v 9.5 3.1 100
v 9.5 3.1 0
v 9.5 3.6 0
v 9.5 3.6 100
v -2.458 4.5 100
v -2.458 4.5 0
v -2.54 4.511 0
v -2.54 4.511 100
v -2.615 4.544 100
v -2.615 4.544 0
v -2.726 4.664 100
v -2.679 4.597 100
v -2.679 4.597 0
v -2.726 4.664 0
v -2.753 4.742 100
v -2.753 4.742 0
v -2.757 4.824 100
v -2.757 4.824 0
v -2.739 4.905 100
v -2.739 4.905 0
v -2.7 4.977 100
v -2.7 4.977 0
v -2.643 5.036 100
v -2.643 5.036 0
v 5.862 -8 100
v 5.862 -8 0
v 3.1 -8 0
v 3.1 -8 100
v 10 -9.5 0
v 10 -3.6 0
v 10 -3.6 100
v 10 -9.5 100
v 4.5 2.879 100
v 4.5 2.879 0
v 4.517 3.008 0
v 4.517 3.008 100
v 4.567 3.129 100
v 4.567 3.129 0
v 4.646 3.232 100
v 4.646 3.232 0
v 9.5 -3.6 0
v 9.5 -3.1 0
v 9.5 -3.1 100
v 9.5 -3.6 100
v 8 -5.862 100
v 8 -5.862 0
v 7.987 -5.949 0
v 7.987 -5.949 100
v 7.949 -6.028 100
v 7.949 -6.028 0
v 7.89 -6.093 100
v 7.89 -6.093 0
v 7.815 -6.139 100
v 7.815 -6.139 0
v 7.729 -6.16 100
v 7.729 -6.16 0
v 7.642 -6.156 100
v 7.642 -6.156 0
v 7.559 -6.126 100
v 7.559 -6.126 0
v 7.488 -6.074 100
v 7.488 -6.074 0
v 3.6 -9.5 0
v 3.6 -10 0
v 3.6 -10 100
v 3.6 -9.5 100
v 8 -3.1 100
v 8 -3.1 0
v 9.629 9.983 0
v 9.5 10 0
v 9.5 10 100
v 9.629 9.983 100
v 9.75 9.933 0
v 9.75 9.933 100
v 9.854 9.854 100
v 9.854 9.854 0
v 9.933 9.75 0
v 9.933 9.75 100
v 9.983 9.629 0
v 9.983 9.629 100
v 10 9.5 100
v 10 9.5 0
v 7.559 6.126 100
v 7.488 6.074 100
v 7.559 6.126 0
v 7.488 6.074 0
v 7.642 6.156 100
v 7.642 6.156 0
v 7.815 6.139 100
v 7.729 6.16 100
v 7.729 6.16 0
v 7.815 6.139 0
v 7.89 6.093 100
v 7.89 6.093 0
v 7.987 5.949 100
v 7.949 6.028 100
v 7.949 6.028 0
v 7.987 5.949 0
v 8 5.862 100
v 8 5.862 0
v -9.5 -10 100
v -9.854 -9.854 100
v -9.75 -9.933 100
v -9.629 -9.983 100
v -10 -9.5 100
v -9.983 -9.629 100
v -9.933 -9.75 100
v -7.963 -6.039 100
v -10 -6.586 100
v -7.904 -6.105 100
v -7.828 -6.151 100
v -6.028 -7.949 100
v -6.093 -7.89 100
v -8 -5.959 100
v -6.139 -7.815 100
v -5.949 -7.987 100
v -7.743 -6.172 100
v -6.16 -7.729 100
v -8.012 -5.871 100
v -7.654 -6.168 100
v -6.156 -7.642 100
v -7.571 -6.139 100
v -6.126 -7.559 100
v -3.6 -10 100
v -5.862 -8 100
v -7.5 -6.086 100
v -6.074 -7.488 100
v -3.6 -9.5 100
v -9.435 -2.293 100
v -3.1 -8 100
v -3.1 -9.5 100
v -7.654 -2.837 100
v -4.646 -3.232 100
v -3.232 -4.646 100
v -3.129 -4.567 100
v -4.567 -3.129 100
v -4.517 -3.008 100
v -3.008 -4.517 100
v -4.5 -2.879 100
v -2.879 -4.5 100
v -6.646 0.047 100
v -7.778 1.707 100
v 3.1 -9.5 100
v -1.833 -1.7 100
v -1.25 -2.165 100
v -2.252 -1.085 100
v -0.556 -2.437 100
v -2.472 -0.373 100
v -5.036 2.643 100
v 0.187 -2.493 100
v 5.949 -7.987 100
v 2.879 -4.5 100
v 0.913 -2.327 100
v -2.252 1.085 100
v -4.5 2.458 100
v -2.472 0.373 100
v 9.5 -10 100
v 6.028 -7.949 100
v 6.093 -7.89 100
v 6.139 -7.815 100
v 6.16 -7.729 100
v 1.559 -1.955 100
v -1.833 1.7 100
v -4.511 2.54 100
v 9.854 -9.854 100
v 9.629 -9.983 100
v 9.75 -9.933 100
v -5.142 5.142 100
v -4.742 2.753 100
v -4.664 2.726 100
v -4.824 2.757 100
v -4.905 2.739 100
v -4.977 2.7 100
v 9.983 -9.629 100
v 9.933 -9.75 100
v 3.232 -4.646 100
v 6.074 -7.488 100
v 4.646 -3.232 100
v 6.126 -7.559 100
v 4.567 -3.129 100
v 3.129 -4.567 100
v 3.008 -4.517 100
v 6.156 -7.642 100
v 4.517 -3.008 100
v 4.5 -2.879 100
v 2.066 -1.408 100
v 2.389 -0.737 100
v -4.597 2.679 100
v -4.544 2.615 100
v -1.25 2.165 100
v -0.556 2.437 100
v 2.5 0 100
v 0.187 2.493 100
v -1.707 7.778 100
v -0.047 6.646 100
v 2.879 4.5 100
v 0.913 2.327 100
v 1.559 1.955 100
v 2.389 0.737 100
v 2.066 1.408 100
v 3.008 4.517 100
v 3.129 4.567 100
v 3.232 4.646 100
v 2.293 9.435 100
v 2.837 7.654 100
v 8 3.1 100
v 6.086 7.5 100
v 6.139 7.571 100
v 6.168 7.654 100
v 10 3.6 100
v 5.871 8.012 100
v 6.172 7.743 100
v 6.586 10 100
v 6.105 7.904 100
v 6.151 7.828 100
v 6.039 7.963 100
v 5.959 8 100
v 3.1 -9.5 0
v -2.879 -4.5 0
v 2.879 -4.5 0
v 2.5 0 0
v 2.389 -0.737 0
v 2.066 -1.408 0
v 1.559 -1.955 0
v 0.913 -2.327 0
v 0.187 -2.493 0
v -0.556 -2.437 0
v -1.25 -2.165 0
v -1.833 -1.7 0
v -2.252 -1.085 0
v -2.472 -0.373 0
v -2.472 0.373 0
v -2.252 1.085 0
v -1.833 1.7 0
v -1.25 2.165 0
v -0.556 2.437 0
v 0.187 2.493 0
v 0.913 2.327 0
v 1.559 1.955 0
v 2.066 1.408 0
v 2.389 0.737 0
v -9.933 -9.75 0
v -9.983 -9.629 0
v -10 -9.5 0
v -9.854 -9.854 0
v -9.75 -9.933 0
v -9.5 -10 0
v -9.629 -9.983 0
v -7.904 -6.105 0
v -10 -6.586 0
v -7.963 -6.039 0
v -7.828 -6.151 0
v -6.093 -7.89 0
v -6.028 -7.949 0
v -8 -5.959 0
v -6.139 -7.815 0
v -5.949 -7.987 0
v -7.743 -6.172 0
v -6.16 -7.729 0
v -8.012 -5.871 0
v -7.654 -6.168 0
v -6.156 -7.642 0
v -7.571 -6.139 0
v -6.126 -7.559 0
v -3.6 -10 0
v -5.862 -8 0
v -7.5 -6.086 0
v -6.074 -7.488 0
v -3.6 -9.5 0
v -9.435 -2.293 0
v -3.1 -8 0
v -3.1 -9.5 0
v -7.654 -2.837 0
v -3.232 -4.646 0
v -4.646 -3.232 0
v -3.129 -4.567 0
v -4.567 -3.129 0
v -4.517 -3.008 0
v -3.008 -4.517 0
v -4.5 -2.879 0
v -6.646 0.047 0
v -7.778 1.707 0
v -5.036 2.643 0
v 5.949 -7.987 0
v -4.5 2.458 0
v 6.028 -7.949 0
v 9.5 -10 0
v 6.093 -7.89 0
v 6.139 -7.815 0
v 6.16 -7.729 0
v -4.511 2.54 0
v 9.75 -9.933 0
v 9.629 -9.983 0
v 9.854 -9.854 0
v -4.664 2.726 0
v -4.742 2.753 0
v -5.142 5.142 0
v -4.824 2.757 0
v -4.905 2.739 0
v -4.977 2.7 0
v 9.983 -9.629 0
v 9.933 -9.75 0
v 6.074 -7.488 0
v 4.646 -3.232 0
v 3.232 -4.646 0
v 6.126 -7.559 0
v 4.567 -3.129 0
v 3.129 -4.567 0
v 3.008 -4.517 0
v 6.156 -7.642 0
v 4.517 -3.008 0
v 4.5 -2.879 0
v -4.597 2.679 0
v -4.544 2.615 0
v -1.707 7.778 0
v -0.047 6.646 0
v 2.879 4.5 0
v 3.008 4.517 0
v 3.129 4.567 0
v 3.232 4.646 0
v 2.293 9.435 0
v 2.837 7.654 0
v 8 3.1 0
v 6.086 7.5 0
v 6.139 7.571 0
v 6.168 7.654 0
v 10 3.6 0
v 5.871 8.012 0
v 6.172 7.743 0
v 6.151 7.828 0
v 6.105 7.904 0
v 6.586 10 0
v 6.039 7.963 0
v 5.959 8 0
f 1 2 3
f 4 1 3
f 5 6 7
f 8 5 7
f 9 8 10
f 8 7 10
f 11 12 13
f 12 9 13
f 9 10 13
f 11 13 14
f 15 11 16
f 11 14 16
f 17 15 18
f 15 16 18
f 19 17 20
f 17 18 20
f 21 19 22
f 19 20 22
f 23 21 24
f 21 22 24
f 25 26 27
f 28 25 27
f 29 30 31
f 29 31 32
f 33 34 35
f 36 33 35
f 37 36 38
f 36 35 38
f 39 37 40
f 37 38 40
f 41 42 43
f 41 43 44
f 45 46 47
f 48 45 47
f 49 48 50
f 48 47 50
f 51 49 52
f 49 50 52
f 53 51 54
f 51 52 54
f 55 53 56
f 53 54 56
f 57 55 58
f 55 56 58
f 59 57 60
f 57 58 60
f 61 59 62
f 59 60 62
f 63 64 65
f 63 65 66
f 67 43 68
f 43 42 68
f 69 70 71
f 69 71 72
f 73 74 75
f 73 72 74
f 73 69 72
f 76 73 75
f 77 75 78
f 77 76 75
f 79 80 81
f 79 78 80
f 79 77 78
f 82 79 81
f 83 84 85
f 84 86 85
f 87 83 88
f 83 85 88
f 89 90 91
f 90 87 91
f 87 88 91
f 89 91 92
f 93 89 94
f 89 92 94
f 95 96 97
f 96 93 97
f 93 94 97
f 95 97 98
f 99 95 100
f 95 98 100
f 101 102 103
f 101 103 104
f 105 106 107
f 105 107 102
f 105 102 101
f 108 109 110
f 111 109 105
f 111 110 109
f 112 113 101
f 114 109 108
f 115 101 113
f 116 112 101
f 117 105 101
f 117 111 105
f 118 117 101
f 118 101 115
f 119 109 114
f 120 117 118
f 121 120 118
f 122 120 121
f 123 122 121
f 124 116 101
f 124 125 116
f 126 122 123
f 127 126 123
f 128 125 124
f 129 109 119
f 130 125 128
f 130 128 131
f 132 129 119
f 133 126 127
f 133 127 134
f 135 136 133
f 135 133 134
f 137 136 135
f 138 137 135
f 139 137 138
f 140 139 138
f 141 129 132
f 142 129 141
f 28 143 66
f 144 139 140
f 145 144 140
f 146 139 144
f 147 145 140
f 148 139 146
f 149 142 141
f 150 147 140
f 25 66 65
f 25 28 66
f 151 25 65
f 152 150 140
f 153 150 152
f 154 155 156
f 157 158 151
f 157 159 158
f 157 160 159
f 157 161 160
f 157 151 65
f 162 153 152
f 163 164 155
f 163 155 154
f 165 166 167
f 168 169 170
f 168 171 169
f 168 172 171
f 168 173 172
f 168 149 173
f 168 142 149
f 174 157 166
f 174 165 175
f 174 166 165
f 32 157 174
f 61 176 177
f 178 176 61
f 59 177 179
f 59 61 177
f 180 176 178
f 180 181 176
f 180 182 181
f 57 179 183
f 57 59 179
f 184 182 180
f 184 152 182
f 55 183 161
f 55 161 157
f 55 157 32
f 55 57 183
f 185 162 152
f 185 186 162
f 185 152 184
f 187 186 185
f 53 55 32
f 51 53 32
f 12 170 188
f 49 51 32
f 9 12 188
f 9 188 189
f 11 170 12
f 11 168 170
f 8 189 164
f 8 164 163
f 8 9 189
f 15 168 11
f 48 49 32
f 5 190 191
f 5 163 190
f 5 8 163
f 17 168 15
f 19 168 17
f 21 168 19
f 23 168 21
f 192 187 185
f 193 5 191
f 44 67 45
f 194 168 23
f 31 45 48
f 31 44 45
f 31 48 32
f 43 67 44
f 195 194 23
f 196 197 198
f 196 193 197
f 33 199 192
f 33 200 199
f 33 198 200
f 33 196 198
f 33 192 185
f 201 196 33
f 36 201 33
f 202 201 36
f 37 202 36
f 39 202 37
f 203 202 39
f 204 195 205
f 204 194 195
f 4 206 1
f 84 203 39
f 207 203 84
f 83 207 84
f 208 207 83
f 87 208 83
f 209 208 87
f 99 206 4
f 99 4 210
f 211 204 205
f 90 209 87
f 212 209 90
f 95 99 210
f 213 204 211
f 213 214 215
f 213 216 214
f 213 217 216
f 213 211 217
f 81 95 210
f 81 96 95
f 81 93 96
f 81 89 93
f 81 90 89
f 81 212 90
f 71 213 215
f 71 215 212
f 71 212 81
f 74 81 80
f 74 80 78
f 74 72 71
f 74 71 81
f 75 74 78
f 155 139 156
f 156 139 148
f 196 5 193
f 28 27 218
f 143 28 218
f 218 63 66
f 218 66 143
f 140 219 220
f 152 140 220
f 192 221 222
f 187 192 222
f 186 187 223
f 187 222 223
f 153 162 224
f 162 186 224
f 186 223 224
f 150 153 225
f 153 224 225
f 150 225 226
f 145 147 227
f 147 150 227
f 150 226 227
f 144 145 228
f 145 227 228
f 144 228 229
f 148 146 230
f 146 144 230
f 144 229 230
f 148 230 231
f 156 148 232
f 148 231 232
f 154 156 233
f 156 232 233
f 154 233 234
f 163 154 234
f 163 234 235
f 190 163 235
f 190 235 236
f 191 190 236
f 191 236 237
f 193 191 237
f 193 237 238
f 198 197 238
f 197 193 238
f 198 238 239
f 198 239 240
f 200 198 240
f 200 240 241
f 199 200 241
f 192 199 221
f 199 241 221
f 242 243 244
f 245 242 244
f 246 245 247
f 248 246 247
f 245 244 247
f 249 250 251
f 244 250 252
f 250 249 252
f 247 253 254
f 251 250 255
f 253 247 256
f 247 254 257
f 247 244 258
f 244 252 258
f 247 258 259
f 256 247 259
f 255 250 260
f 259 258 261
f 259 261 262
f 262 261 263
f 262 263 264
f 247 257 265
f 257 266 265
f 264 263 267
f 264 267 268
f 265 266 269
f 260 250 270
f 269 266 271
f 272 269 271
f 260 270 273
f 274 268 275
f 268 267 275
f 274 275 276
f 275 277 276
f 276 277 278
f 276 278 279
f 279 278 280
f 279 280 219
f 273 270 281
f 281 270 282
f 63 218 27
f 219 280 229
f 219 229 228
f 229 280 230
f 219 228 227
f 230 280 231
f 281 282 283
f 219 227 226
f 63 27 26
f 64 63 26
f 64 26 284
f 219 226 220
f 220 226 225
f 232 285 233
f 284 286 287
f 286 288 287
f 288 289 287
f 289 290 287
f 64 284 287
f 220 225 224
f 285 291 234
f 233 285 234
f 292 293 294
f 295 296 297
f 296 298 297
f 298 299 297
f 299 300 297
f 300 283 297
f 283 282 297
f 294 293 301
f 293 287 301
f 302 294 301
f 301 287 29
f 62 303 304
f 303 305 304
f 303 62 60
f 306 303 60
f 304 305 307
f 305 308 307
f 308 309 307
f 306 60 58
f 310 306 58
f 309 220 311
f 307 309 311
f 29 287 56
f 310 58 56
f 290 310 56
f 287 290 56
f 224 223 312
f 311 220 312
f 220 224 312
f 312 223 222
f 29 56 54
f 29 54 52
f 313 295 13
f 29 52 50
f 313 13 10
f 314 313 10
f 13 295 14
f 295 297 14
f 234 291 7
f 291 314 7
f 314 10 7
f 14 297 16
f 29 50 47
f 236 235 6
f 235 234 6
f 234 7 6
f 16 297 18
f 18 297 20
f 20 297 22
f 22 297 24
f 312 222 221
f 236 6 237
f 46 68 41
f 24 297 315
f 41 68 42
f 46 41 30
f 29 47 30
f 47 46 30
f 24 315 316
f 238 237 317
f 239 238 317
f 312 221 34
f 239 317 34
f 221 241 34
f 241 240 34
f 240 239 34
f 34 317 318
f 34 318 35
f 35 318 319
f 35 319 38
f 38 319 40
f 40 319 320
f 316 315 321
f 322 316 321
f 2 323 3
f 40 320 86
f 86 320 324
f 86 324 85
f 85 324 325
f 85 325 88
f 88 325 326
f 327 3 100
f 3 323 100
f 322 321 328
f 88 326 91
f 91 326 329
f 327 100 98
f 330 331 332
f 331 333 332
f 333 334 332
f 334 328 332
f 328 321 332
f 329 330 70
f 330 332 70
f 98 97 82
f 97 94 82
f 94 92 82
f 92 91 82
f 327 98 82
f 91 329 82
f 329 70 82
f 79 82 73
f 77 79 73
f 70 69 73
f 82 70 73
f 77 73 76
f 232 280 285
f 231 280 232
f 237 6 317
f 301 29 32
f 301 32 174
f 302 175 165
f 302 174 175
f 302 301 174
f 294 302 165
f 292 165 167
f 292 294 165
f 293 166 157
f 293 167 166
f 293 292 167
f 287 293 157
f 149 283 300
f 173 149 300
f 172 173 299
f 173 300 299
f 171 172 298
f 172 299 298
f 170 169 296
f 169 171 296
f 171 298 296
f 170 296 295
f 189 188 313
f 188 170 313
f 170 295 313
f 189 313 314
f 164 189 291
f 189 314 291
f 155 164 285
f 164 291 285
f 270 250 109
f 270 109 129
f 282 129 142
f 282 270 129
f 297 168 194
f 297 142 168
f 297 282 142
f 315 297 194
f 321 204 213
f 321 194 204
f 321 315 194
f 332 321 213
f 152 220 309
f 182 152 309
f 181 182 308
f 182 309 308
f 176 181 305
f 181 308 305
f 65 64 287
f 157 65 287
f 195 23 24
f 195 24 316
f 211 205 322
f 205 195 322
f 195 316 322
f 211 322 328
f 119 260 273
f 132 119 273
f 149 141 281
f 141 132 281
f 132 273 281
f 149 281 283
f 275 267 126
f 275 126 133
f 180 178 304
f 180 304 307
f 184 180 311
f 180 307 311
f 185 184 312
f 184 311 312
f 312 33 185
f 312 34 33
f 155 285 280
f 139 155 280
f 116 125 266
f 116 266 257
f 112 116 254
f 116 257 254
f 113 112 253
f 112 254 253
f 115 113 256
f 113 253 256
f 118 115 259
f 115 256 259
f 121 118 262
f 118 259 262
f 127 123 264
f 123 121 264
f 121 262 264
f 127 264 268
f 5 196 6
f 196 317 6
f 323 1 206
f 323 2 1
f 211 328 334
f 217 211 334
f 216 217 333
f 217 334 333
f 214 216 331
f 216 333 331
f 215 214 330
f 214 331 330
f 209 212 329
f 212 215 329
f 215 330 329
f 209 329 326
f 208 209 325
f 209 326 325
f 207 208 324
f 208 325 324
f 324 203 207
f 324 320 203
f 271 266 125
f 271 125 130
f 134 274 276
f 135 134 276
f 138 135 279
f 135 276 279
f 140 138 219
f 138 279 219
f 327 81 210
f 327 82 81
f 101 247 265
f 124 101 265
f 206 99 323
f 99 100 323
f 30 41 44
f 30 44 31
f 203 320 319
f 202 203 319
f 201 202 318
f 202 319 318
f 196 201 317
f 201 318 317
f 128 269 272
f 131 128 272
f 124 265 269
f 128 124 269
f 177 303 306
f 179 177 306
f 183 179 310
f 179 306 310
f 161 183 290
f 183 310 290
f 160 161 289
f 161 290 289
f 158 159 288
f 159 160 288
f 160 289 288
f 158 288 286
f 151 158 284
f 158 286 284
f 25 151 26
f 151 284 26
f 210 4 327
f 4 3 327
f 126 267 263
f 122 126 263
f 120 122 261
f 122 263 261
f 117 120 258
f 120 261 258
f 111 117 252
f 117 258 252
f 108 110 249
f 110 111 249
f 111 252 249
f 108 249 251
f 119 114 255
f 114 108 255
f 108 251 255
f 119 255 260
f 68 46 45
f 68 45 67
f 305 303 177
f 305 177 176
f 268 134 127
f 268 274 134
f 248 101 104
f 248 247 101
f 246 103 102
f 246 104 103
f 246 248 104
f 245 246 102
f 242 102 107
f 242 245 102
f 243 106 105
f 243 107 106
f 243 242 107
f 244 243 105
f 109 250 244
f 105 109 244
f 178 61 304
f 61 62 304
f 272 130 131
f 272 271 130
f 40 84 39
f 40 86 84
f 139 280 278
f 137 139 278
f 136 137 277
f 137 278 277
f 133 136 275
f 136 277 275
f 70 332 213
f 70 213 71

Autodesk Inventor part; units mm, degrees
ref_plane "YZ Plane" through (0, 0, 0) normal (1, 0, 0) x (0, 1, 0)
ref_plane "XZ Plane" through (0, 0, 0) normal (0, 1, 0) x (-1, 0, 0)
ref_plane "XY Plane" through (0, 0, 0) normal (0, 0, 1) x (1, 0, 0)
sketch "Esboço1" plane through (0, 0, 0) normal (0, 0, 1) x (1, 0, 0)
  circle A0 centre (0, 0) radius 2.5
  line L0 (-10, 10) -> (10, 10) construction
  line L1 (10, 10) -> (10, 3.1) construction
  line L2 (8, 3.1) -> (10, 3.1) construction
  line L3 (10, 10) -> (0, 0) construction
  line L4 (-4.5, 4.5) -> (4.5, 4.5) construction
  line L5 (10, -3.1) -> (10, -10) construction
  line L6 (8, -3.1) -> (10, -3.1) construction
  line L7 (4.5, 4.5) -> (4.5, -4.5) construction
  line L8 (-4.5, -4.5) -> (4.5, -4.5) construction
  line L9 (-4.5, 4.5) -> (-4.5, -4.5) construction
  line L10 (8, 6.5858) -> (4.5, 3.0858) construction
  line L11 (8, 6.5858) -> (8, 3.1) construction
  line L12 (0, 0) -> (10, -10) construction
  line L13 (4.5, -3.0858) -> (8, -6.5858) construction
  line L14 (8, -3.1) -> (8, -6.5858) construction
  line L15 (3.0858, -4.5) -> (6.5858, -8) construction
  line L16 (3.1, -10) -> (10, -10) construction
  line L17 (3.1, -8) -> (3.1, -10) construction
  line L18 (3.1, -8) -> (6.5858, -8) construction
  line L19 (0, 0) -> (-10, -10) construction
  line L20 (-10, -10) -> (-3.1, -10) construction
  line L21 (-3.1, -8) -> (-3.1, -10) construction
  line L22 (-3.0858, -4.5) -> (-6.5858, -8) construction
  line L23 (-6.5858, -8) -> (-3.1, -8) construction
  line L24 (-4.5, -3.0858) -> (-8, -6.5858) construction
  arc A1 (-2.8787, -4.5) -> (-3.2322, -4.6464) centre (-2.8787, -5) ccw
  arc A2 (3.2322, -4.6464) -> (2.8787, -4.5) centre (2.8787, -5) ccw
  line L25 (-2.8787, -4.5) -> (2.8787, -4.5)
  line L26 (-3.2322, -4.6464) -> (-6.5858, -8) construction
  arc A3 (4.5, -2.8787) -> (4.6464, -3.2322) centre (5, -2.8787) ccw
  arc A4 (4.6464, 3.2322) -> (4.5, 2.8787) centre (5, 2.8787) ccw
  line L27 (-10, 10) -> (0, 0) construction
  line L28 (4.6464, 3.2322) -> (8, 6.5858) construction
  arc A5 (7.4879, -6.0737) -> (8, -5.8615) centre (7.7, -5.8615) ccw
  line L29 (7.4879, -6.0737) -> (4.6464, -3.2322)
  line L30 (8, -5.8615) -> (8, -3.1)
  arc A6 (5.8615, -8) -> (6.0737, -7.4879) centre (5.8615, -7.7) ccw
  line L31 (5.8615, -8) -> (3.1, -8)
  line L32 (6.0737, -7.4879) -> (3.2322, -4.6464)
  arc A7 (8, 5.8615) -> (7.4879, 6.0737) centre (7.7, 5.8615) ccw
  line L33 (7.4879, 6.0737) -> (4.6464, 3.2322)
  line L34 (8, 5.8615) -> (8, 3.1)
  line L35 (10, 3.1) -> (9.5, 3.1) construction
  line L36 (9.5, 3.1) -> (9.5, 3.6)
  line L37 (9.5, 3.6) -> (10, 3.6)
  line L38 (10, 3.6) -> (10, 3.1) construction
  line L39 (9.5, 3.1) -> (8, 3.1)
  line L40 (10, -3.1) -> (9.5, -3.1) construction
  line L41 (9.5, -3.1) -> (9.5, -3.6)
  line L42 (9.5, -3.6) -> (10, -3.6)
  line L43 (10, -3.6) -> (10, -3.1) construction
  line L44 (9.5, -3.1) -> (8, -3.1)
  line L45 (10, -3.6) -> (10, -10) construction
  line L46 (3.1, -10) -> (3.6, -10) construction
  line L47 (3.6, -10) -> (3.6, -9.5)
  line L48 (3.6, -9.5) -> (3.1, -9.5)
  line L49 (3.1, -9.5) -> (3.1, -10) construction
  line L50 (3.1, -8) -> (3.1, -9.5)
  line L51 (3.6, -10) -> (10, -10) construction
  line L52 (4.5, 2.8787) -> (4.5, -2.8787)
  line L53 (10, 10) -> (10, 3.6) construction
  line L54 (-4.5, 3.086) -> (-4.5, -3.0858) construction
  line L55 (6.5858, 8) -> (3.0858, 4.5) construction
  line L56 (3.0858, 4.5) -> (-3.086, 4.5)
  line L57 (-10, 10) -> (-10, -10) construction
  arc A8 (6.5858, 10) -> (-10, -6.5858) centre (6.5858, -6.5858) ccw
  arc A9 (6.5858, 8) -> (-8, -6.5858) centre (5.9872, -5.9872) ccw construction
  arc A10 (-4.5, 2.4583) -> (-5.0362, 2.6432) centre (-4.8, 2.4583) ccw
  arc A11 (-8.0123, -5.8714) -> (-7.5002, -6.086) centre (-7.7123, -5.8739) ccw
  arc A12 (-5.0362, 2.6432) -> (-8.0123, -5.8714) centre (5.9872, -5.9872) ccw
  arc A13 (-4.6464, -3.2322) -> (-4.5, -2.8787) centre (-5, -2.8787) ccw
  line L58 (-4.5, 2.4583) -> (-4.5, -2.8787)
  line L59 (-7.5002, -6.086) -> (-4.6464, -3.2322)
  line L60 (-10, -6.5858) -> (-10, -10) construction
  line L61 (6.5858, 10) -> (10, 10) construction
  arc A14 (-6.0737, -7.4879) -> (-5.8615, -8) centre (-5.8615, -7.7) ccw
  arc A15 (-2.6432, 5.0362) -> (-2.4583, 4.5) centre (-2.4583, 4.8) ccw
  arc A16 (6.086, 7.5002) -> (5.8714, 8.0123) centre (5.8739, 7.7123) ccw
  arc A17 (2.8787, 4.5) -> (3.2322, 4.6464) centre (2.8787, 5) ccw
  arc A18 (5.8714, 8.0123) -> (-2.6432, 5.0362) centre (5.9872, -5.9872) ccw
  line L62 (3.2322, 4.6464) -> (6.086, 7.5002)
  line L63 (-3.2322, -4.6464) -> (-6.0737, -7.4879)
  line L64 (-5.8615, -8) -> (-3.1, -8)
  line L65 (-3.1, -10) -> (-3.6, -10) construction
  line L66 (-3.6, -10) -> (-3.6, -9.5)
  line L67 (-3.6, -9.5) -> (-3.1, -9.5)
  line L68 (-3.1, -9.5) -> (-3.1, -10) construction
  line L69 (-3.1, -8) -> (-3.1, -9.5)
  line L70 (-10, -10) -> (-3.6, -10) construction
  arc A19 (-10, -9.5) -> (-9.5, -10) centre (-9.5, -9.5) ccw
  line L71 (-10, -6.5858) -> (-10, -9.5)
  line L72 (-9.5, -10) -> (-3.6, -10)
  arc A20 (9.5, -10) -> (10, -9.5) centre (9.5, -9.5) ccw
  line L73 (10, -3.6) -> (10, -9.5)
  line L74 (3.6, -10) -> (9.5, -10)
  arc A21 (10, 9.5) -> (9.5, 10) centre (9.5, 9.5) ccw
  line L75 (10, 9.5) -> (10, 3.6)
  line L76 (6.5858, 10) -> (9.5, 10)
  point P0 (0, 10)
  point P1 (-4.5, 0)
  point P2 (-6.55, -10)
  point P3 (2.8787, 4.5)
  point P4 (-2.4583, 4.5)
  dimension "d0" = 5
  dimension "d1" = 20
  dimension "d2" = 10
  dimension "d4" = 6.9
  dimension "d5" = 2
  dimension "d6" = 2
  dimension "d7" = 6.2
  dimension "d8" = 1
  dimension "d12" = 1
  dimension "d13" = 1
  dimension "d14" = 1
  dimension "d15" = 0.5
  dimension "d16" = 0.5
  dimension "d17" = 0.5
  dimension "d18" = 0.5
  dimension "d19" = 0.3
  dimension "d20" = 0.3
  dimension "d21" = 0.3
  dimension "d22" = 0.5
  dimension "d28" = 1.414
  dimension "d30" = 1
  dimension "d31" = 1.414
  dimension "d34" = 0.3
  dimension "d36" = 0.3
  dimension "d37" = 14
  dimension "d38" = 0.5
  dimension "d39" = 0.3
  dimension "d40" = 0.3
  dimension "d41" = 0.3
  dimension "d42" = 0.5
  dimension "d43" = 0.5
  dimension "d44" = 0.5
  dimension "d45" = 0.5
extrude "Extrusão1" add sketch "Esboço1" along normal blind 100
equation "\"d12\" = d8"
equation "\"d16\" = d15"
equation "\"d17\" = d15"
equation "\"d18\" = d15"
equation "\"d30\" = d8"
equation "\"d31\" = d28"
properties part number "Perfil_20×20_R90_001"
